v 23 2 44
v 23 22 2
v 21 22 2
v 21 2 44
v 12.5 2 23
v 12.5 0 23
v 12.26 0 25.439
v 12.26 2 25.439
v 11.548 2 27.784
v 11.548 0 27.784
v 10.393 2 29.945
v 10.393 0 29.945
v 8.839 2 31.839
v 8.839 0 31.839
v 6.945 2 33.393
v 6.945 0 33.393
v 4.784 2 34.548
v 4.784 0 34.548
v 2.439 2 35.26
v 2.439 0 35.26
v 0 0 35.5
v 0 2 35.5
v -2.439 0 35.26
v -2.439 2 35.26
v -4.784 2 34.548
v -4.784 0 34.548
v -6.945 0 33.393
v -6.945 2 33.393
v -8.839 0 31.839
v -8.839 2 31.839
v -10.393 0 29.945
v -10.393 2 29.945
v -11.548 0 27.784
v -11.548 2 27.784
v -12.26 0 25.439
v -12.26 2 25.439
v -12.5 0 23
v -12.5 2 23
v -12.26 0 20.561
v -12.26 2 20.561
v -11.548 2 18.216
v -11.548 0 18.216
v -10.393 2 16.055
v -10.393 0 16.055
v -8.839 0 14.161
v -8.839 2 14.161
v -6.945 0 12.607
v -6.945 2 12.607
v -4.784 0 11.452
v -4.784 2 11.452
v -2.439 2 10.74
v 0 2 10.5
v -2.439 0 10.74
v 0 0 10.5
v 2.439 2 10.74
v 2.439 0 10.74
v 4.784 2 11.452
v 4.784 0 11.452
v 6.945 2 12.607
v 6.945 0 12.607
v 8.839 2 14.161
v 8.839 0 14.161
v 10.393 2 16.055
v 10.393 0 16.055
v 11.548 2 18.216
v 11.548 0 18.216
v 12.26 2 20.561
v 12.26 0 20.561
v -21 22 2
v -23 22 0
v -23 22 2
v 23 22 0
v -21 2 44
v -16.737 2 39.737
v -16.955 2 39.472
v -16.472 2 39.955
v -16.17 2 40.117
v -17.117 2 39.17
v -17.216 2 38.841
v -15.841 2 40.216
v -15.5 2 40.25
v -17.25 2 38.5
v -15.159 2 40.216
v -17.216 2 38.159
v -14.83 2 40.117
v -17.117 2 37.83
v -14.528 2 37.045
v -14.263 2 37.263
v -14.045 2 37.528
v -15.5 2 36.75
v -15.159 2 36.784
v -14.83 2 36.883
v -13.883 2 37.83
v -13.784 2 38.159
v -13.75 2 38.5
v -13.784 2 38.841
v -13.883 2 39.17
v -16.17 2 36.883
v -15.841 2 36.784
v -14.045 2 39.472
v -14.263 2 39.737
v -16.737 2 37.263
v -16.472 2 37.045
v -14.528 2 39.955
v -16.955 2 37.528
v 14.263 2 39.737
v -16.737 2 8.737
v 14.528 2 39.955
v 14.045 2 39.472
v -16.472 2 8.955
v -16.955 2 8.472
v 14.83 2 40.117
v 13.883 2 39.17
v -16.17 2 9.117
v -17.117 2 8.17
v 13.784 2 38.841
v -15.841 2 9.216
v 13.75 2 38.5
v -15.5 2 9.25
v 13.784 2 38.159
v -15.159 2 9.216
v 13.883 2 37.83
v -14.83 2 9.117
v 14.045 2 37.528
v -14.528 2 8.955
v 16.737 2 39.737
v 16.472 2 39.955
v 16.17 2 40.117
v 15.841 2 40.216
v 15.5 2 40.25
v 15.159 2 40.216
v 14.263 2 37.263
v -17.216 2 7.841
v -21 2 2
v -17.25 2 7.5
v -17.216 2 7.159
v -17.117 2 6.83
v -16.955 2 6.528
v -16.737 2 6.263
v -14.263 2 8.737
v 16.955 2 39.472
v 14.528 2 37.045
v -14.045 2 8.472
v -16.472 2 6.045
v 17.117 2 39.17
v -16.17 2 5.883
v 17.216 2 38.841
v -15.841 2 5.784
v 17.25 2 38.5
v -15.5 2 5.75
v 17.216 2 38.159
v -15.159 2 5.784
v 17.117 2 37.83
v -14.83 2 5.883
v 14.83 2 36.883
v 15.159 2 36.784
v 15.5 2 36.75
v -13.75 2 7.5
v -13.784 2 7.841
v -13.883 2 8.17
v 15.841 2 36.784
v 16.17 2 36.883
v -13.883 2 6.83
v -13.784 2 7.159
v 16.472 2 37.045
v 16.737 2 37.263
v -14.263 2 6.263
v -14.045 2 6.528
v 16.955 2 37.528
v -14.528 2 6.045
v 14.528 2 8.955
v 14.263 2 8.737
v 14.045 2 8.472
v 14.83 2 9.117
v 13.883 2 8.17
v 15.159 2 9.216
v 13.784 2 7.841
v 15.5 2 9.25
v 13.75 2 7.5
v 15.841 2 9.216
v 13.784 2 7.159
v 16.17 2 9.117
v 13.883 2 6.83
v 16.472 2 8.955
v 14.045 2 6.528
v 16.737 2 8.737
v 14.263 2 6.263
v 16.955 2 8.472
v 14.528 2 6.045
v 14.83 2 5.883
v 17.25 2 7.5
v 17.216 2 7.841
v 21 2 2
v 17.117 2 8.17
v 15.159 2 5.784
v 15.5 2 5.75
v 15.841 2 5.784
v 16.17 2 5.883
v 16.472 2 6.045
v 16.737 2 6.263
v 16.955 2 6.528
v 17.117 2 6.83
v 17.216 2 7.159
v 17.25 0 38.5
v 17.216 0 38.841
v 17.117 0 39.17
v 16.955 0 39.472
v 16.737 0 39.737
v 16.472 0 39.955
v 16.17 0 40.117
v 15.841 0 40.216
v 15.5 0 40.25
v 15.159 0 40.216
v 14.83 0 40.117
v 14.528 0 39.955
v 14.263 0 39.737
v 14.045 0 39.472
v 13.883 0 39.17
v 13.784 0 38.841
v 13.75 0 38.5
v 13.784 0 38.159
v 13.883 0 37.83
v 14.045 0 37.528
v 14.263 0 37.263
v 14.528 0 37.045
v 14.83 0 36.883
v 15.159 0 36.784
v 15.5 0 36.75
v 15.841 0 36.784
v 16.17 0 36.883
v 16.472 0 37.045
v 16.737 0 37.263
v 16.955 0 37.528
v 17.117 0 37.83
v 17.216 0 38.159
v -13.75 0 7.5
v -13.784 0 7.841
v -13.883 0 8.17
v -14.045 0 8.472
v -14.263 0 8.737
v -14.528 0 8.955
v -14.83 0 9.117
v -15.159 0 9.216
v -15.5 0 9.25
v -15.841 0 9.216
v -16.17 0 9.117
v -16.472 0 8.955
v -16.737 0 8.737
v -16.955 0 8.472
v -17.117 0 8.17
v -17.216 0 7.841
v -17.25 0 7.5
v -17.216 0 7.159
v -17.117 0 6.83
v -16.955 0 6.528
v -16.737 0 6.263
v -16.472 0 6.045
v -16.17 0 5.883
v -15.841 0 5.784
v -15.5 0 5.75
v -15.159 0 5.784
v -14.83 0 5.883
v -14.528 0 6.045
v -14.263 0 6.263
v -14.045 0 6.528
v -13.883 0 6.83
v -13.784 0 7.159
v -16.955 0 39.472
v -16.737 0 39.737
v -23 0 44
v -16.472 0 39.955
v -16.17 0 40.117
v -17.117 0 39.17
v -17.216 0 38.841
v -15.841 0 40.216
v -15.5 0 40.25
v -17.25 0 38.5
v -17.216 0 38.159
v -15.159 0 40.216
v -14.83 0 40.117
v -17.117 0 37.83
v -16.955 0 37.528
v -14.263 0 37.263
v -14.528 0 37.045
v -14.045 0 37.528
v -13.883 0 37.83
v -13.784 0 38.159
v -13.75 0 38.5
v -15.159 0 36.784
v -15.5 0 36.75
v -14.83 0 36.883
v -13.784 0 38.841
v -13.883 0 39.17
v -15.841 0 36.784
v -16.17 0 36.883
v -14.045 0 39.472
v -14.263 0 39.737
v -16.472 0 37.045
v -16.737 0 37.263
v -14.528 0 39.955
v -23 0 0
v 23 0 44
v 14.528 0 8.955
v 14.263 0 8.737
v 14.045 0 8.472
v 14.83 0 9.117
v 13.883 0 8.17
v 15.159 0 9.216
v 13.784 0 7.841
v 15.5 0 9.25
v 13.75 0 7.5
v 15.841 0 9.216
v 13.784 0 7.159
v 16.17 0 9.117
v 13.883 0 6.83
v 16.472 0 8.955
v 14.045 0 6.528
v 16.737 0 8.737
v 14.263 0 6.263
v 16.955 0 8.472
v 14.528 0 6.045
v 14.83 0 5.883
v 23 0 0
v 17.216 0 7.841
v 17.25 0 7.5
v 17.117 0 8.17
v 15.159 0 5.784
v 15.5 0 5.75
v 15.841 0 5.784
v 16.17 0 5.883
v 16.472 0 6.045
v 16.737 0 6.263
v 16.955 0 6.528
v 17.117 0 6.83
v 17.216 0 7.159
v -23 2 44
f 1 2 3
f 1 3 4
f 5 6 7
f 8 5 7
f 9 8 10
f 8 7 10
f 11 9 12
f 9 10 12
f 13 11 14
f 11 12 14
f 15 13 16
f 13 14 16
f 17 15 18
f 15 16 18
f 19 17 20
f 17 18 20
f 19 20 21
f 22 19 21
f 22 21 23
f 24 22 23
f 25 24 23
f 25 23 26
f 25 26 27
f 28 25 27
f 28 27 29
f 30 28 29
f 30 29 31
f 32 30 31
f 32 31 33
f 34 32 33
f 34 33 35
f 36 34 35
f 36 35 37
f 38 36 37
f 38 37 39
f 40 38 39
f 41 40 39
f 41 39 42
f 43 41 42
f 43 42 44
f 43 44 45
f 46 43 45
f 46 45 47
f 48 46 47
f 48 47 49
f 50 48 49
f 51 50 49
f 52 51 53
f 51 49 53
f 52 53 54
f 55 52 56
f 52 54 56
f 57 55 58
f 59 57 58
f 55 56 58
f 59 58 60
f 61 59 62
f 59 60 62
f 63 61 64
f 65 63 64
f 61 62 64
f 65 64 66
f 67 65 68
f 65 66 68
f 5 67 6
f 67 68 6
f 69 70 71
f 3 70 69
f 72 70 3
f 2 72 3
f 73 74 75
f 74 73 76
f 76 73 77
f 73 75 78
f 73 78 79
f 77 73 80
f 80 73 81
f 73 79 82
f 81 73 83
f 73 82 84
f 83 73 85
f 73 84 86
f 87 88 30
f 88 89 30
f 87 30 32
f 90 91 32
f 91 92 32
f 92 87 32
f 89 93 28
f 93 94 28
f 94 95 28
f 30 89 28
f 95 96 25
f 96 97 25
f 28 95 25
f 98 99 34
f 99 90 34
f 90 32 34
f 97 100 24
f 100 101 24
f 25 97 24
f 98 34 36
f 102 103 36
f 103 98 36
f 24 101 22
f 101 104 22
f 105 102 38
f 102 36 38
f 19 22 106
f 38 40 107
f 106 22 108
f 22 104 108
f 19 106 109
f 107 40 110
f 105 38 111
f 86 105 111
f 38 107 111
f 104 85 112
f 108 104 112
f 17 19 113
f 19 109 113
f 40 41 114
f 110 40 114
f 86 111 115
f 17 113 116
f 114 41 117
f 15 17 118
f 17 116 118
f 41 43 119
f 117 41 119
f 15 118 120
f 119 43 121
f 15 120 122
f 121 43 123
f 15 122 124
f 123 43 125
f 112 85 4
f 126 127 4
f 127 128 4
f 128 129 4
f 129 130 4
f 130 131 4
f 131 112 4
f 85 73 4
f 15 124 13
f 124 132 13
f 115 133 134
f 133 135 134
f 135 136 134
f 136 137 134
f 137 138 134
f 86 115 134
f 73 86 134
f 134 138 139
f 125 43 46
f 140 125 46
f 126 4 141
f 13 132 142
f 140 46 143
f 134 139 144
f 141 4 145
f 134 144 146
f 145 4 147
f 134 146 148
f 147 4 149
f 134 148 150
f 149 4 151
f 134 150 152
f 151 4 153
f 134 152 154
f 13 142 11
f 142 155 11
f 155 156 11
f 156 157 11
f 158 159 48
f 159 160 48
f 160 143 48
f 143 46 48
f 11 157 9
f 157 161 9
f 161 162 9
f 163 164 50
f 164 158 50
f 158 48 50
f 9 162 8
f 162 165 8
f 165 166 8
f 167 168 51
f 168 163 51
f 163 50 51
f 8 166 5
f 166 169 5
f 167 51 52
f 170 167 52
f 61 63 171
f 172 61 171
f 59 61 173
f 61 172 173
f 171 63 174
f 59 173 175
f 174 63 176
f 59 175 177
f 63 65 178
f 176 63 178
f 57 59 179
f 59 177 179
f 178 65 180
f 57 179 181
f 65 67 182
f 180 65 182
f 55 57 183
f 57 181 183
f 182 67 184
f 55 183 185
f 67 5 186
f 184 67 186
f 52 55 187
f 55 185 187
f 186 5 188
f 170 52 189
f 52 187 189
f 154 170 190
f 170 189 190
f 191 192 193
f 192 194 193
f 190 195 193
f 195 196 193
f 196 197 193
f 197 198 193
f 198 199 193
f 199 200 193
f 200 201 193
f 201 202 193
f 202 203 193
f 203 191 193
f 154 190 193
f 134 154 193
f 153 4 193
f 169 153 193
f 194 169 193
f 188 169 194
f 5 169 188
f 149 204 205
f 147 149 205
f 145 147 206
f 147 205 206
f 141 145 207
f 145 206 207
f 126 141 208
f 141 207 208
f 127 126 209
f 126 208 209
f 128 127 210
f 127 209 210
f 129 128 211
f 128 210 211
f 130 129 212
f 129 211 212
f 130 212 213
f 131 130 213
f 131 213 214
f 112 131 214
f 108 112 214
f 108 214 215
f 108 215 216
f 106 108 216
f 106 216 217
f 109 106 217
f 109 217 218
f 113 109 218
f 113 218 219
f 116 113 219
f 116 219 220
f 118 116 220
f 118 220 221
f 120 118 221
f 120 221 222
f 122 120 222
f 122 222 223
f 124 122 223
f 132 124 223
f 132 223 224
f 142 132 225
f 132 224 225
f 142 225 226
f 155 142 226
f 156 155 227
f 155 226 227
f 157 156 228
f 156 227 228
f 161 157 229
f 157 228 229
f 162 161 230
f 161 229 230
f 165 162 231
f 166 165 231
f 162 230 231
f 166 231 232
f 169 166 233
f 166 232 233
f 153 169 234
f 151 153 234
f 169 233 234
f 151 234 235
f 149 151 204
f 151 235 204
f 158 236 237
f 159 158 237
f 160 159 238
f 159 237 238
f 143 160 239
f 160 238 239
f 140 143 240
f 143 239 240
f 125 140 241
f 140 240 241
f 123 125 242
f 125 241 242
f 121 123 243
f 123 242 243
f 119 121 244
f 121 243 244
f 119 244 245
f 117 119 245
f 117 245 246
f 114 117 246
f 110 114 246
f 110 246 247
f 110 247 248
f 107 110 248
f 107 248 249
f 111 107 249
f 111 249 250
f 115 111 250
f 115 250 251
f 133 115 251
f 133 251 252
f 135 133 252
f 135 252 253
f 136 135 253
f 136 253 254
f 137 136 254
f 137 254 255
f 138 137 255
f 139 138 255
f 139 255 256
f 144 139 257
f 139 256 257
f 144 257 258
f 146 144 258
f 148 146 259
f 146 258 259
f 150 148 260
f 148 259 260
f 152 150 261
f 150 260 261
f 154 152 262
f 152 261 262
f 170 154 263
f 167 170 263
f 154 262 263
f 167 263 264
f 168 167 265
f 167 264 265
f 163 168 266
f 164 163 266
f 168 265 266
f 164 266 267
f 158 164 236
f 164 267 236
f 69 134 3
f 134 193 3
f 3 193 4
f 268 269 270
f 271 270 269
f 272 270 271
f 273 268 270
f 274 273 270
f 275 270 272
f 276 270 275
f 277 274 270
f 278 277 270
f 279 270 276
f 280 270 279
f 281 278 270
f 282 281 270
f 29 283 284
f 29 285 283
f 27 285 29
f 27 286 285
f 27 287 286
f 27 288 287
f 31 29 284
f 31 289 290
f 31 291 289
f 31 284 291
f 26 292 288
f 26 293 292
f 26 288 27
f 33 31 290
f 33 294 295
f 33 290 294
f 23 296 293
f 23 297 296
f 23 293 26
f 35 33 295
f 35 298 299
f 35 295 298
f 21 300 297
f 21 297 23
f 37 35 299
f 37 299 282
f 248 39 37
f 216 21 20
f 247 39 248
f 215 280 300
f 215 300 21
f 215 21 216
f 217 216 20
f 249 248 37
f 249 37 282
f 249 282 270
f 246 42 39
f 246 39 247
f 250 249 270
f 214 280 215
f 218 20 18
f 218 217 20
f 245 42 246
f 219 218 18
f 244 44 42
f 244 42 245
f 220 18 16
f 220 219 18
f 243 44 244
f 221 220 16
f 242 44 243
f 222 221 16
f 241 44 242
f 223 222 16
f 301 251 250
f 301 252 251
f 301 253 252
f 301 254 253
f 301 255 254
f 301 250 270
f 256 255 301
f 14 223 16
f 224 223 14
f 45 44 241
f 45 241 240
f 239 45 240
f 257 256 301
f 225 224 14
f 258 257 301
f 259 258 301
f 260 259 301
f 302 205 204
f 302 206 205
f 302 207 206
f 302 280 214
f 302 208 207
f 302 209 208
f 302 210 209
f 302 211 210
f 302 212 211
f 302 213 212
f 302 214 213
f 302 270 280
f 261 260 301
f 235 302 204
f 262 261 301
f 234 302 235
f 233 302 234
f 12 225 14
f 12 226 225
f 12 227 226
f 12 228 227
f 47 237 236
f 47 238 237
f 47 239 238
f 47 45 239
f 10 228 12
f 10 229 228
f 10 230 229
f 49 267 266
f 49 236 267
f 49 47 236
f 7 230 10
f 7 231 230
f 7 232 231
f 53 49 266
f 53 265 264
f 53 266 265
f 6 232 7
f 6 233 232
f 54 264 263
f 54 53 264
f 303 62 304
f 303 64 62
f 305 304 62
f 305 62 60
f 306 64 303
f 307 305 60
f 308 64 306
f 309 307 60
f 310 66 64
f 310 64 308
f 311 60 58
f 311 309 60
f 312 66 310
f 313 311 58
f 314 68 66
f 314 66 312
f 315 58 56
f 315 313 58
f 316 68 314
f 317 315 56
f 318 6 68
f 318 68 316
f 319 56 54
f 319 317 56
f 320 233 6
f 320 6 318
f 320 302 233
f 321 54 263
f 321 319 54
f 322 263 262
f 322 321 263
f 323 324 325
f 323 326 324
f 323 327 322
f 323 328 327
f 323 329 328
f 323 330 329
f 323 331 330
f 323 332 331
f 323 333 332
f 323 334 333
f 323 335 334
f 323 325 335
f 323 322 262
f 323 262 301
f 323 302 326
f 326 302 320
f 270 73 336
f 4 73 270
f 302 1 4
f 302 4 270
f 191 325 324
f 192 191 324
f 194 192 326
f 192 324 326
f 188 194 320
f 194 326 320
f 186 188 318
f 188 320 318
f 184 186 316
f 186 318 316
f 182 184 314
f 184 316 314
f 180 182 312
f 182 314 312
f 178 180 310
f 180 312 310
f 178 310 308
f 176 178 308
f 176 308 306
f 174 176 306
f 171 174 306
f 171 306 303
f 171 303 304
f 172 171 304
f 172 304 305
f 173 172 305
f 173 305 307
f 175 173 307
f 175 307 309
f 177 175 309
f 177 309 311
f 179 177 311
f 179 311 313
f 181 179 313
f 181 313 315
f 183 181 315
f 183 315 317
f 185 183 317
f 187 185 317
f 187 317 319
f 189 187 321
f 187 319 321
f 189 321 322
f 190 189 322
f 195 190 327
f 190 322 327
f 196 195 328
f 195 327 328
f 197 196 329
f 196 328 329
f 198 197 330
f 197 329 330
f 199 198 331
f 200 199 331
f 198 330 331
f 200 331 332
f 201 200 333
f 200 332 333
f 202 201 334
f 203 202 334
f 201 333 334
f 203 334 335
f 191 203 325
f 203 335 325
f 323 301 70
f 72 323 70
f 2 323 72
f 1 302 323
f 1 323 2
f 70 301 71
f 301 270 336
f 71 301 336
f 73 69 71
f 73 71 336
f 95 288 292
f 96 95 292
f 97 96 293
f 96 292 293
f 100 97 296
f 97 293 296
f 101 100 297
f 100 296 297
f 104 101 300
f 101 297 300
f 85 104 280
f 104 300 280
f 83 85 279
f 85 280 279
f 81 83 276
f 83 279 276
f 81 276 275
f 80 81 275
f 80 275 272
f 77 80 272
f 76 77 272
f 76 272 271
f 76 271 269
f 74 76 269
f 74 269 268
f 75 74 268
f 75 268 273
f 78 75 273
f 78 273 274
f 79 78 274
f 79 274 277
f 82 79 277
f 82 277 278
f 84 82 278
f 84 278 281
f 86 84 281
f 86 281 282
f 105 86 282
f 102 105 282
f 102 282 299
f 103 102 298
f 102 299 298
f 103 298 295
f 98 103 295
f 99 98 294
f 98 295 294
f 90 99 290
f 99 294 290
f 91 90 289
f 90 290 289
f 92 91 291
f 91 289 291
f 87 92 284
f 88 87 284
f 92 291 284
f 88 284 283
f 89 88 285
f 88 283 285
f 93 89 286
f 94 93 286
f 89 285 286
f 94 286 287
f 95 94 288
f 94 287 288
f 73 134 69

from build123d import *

# Parameters (mm, degrees)
F1_DEPTH = 23
F3_DEPTH = 21
F4_R     = 12.5
F4_R_2   = 1.75
F5_DEPTH = 22.001


with BuildPart() as f1:
    # F0 (on Right) → F1 (new body, symmetric)
    with BuildSketch(Plane.YZ):
        Polygon((2, 44), (0, 44), (0, 0), (22, 0), (22, 2), align=None)
    extrude(amount=F1_DEPTH, both=True)

    # F2 (on Right) → F3 (cut, symmetric)
    with BuildSketch(Plane.YZ):
        Polygon((2, 2), (22, 2), (2, 44), align=None)
    extrude(amount=F3_DEPTH, both=True, mode=Mode.SUBTRACT)

    # F4 (on face) → F5 (cut, through all)
    with BuildSketch(Plane.XZ):
        with Locations((0, 23)):
            Circle(F4_R)
        with Locations((-15.5, 38.5)):
            Circle(F4_R_2)
        with Locations((-15.5, 7.5)):
            Circle(F4_R_2)
        with Locations((15.5, 38.5)):
            Circle(F4_R_2)
        with Locations((15.5, 7.5)):
            Circle(F4_R_2)
    extrude(amount=-F5_DEPTH, mode=Mode.SUBTRACT)


solid = f1.part
